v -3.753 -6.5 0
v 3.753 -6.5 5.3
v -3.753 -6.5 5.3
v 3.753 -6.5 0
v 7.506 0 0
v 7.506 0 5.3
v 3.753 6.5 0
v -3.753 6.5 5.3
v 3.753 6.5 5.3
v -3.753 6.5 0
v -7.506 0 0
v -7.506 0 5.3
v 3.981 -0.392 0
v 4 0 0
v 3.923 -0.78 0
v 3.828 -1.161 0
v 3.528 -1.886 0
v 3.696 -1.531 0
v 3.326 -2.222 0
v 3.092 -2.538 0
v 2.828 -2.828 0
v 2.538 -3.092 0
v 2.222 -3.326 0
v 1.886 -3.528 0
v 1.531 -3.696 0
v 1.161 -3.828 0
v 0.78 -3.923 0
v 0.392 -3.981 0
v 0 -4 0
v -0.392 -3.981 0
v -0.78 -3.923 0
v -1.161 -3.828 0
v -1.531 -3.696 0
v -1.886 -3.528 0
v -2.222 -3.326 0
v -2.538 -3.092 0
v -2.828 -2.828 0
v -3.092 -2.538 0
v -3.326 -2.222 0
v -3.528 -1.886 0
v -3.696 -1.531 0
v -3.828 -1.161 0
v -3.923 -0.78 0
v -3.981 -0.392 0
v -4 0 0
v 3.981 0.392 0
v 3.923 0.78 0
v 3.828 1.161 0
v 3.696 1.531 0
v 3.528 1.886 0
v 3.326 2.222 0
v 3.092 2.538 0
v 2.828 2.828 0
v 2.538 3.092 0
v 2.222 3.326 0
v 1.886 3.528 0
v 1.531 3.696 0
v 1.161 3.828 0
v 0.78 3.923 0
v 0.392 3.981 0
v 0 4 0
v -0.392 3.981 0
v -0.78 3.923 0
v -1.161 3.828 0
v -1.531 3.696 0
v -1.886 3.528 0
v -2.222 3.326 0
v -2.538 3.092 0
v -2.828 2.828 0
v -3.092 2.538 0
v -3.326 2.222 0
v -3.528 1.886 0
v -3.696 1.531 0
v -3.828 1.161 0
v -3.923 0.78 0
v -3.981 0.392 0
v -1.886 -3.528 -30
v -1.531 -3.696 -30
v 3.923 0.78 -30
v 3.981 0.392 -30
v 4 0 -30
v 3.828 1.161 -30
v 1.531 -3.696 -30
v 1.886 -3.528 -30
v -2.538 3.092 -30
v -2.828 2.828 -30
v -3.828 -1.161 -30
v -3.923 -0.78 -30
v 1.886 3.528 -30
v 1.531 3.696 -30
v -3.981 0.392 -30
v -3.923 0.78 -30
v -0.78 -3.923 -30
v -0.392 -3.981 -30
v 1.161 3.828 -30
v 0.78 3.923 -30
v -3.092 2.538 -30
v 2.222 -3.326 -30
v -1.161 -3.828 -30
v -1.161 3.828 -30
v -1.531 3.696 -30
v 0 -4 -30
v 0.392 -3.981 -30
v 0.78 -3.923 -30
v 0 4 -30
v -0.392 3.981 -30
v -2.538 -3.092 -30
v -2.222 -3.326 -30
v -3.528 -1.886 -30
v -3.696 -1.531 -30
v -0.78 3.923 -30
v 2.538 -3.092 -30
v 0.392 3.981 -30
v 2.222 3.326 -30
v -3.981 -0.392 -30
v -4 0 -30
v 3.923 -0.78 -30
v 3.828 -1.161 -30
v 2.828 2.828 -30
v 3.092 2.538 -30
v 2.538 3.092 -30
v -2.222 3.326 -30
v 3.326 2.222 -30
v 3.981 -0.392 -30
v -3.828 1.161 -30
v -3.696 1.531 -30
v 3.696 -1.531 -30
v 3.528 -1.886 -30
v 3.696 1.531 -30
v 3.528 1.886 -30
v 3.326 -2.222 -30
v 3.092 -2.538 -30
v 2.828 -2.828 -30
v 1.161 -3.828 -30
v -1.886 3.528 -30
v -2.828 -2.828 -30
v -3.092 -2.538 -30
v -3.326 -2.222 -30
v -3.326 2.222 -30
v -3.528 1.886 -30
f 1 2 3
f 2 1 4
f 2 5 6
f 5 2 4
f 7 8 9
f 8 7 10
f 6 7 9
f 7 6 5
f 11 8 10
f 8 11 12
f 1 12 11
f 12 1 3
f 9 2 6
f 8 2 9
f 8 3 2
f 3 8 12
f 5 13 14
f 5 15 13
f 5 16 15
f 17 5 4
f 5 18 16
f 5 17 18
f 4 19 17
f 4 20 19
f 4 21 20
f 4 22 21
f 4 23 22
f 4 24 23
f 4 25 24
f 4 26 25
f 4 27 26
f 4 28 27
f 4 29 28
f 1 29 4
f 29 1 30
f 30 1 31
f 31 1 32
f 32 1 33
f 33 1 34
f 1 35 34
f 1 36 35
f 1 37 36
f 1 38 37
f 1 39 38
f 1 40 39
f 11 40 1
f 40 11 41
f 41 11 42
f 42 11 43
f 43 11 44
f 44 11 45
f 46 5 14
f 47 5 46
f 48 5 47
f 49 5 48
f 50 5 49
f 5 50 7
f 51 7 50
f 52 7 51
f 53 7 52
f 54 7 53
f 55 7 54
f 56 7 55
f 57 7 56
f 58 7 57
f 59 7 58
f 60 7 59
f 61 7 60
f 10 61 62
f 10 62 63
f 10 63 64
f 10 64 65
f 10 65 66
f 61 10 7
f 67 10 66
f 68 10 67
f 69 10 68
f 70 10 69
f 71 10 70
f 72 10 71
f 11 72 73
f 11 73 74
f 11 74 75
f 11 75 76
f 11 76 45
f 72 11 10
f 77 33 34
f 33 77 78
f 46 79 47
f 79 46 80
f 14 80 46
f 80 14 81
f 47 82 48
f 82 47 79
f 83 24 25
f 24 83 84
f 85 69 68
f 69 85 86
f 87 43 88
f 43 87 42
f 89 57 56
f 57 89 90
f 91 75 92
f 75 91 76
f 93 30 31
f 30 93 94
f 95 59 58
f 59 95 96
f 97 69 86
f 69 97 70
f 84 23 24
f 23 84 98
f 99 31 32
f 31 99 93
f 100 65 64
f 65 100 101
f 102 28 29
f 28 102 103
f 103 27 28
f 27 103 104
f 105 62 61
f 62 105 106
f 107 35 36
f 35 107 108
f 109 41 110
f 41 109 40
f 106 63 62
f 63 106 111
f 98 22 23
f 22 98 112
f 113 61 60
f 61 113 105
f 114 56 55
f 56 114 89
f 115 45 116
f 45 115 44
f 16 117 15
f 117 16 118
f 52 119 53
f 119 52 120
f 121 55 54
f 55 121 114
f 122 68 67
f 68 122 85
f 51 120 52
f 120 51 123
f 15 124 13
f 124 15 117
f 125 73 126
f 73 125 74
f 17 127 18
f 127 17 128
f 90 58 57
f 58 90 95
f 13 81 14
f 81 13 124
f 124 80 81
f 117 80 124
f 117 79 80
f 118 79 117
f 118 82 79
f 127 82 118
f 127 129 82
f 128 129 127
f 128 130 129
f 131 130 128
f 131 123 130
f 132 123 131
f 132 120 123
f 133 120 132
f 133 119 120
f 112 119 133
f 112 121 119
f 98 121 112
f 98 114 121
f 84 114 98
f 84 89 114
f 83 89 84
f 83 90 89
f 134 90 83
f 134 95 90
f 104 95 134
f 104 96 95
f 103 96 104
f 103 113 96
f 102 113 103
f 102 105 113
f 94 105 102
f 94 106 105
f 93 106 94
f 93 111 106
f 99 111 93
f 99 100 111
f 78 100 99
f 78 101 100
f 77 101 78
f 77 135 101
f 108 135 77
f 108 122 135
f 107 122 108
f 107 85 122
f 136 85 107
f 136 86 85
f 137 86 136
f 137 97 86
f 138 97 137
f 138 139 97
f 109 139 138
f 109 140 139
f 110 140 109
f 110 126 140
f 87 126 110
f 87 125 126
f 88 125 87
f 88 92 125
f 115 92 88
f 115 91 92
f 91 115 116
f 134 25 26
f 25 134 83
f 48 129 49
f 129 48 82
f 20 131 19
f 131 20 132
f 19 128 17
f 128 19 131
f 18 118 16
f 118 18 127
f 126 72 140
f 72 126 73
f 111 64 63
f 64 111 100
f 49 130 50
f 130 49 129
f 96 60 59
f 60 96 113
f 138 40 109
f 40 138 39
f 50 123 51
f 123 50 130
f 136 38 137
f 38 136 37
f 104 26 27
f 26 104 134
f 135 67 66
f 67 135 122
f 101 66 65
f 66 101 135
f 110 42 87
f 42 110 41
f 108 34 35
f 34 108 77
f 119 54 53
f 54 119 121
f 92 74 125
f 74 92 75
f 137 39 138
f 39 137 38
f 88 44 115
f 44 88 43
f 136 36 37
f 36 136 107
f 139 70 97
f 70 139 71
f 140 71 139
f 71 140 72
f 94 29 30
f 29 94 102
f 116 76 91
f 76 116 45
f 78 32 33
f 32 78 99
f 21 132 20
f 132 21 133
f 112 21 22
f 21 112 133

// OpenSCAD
// M8 Hex Bolt (Simplified)

// Parameters
s = 13;   // Across-flats distance (mm)
k = 5.3;  // Head height (mm)
d = 8;    // Shank diameter (mm)
l = 30;   // Shank length (mm)

$fn = 64; // Smoothness for cylindrical parts

union() {
    // Head (Hexagonal Prism at Z >= 0)
    // Calculating circumcircle radius from across-flats distance (s): r = (s / 2) / cos(30)
    cylinder(h = k, r = (s / 2) / cos(30), $fn = 6, center = false);

    // Shank (Cylinder extending into Z < 0)
    translate([0, 0, -l])
        cylinder(h = l, d = d, center = false);
}
